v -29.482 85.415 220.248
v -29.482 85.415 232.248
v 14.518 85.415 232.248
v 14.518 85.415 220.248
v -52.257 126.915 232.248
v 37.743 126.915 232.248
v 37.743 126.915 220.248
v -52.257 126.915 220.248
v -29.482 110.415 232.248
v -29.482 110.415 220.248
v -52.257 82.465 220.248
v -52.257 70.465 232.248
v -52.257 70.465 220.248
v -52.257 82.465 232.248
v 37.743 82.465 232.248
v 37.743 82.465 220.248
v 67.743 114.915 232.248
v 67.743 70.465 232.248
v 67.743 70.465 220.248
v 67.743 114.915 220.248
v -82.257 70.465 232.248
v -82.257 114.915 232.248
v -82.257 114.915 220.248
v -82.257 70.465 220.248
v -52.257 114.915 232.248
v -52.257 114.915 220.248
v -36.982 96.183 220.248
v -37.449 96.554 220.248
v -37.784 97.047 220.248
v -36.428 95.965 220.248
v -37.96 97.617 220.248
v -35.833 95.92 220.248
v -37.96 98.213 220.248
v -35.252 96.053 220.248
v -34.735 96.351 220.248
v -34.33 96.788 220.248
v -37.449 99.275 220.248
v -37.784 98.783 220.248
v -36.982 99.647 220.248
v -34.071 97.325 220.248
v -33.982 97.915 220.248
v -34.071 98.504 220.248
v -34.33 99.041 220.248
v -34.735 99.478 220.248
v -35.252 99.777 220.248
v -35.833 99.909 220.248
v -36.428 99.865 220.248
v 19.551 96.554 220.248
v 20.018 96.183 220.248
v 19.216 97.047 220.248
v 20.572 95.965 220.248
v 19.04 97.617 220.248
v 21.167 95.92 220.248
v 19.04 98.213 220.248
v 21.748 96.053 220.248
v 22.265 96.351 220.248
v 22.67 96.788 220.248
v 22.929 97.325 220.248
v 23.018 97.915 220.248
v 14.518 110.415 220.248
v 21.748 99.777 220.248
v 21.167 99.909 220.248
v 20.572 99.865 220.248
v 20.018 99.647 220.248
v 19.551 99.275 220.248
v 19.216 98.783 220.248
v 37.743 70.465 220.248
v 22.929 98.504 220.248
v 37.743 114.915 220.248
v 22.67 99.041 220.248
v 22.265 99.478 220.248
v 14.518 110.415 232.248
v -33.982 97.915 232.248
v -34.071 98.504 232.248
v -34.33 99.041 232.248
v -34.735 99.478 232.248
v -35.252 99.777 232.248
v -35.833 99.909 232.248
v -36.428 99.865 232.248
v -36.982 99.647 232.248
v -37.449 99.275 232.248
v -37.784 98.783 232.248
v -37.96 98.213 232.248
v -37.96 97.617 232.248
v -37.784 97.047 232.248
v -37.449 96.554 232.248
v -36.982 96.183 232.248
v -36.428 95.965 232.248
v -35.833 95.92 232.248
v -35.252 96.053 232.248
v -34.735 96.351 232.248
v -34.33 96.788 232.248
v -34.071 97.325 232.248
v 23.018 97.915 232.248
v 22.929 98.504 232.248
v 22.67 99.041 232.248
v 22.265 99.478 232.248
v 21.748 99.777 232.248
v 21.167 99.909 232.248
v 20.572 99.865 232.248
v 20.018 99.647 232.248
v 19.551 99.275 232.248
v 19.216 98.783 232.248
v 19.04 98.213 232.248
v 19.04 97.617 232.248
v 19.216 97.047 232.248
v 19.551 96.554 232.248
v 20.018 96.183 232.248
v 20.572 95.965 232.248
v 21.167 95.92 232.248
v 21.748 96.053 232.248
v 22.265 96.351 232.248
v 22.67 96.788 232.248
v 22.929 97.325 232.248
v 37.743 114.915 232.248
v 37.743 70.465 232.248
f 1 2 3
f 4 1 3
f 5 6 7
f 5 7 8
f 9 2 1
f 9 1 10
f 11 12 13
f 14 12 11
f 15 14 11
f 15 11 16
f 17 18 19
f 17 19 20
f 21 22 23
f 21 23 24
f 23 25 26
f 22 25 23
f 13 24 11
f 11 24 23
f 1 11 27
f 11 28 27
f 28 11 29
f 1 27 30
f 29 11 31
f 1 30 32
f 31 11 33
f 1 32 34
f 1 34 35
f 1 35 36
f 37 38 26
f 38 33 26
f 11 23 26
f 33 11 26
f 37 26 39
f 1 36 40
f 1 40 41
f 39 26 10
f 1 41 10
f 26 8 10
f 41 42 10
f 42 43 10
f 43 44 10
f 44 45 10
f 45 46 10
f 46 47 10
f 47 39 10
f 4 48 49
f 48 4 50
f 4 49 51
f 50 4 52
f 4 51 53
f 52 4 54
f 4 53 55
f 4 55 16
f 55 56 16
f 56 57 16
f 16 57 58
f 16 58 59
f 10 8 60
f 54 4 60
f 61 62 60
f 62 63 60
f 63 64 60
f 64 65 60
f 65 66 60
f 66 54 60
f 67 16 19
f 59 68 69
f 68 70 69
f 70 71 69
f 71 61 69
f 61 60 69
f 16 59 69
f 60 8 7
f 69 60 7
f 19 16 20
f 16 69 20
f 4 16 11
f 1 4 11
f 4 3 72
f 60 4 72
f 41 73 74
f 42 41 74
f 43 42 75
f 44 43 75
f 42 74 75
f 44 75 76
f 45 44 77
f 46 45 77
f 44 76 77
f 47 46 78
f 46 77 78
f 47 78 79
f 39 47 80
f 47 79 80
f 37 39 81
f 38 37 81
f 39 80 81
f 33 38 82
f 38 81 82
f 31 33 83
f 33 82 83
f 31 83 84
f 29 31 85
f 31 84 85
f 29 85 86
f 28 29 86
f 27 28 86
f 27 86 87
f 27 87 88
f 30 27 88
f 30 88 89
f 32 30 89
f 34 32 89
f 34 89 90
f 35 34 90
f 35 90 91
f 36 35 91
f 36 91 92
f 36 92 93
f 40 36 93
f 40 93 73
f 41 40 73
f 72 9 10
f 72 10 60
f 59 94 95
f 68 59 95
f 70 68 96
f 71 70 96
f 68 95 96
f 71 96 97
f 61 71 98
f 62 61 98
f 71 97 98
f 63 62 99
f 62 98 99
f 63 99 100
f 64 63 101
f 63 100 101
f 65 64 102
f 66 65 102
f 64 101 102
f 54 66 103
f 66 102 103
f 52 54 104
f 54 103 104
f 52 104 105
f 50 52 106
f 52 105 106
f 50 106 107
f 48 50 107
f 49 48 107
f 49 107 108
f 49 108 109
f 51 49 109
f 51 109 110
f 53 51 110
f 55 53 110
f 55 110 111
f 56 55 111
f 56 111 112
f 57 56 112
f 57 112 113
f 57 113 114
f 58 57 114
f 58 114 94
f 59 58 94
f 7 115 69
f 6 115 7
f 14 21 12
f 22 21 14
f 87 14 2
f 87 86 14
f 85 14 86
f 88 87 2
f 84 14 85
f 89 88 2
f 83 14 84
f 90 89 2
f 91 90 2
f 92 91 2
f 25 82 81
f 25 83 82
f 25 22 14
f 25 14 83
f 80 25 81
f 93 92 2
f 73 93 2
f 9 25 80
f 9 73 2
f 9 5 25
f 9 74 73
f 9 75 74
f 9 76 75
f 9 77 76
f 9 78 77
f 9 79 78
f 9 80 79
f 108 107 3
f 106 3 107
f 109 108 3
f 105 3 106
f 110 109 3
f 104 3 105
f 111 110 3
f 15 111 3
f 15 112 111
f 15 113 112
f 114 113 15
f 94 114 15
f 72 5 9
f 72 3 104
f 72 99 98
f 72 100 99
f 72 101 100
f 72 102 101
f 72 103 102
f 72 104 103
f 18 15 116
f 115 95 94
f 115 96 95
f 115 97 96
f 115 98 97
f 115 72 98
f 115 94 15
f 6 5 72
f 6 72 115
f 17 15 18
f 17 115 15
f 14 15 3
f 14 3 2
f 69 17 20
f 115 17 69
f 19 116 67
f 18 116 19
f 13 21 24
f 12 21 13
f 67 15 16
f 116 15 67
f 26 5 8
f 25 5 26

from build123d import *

# Parameters (mm, degrees)
SKETCH1_W                    = 44
SKETCH1_H                    = 25
BOSS_EXTRUDE1_DEPTH          = 12
F_4_0_4_DIAMETER_HOLE1_D     = 4
F_4_0_4_DIAMETER_HOLE1_DEPTH = 25
F_4_0_4_DIAMETER_HOLE1_TIP   = 1.201721238


with BuildPart() as part:
    # Sketch1 → Boss-Extrude1 (new body)
    with BuildSketch(Plane.XY.offset(232.248004761)):
        Polygon((-82.257473883, 114.914823413), (-82.257473883, 82.464823413), (-82.257473883, 70.464823413), (-52.257473883, 70.464823413), (-52.257473883, 82.464823413), (-29.482473883, 82.464823413), (14.967526117, 82.464823413), (37.742526117, 82.464823413), (37.742526117, 70.464823413), (67.742526117, 70.464823413), (67.742526117, 82.464823413), (67.742526117, 114.914823413), (37.742526117, 114.914823413), (37.742526117, 126.914823413), (-52.257473883, 126.914823413), (-52.257473883, 114.914823413), align=None)
        with Locations((-7.482473883, 97.914823413)):
            Rectangle(SKETCH1_W, SKETCH1_H, mode=Mode.SUBTRACT)
    extrude(amount=-BOSS_EXTRUDE1_DEPTH)

    # Ø4.0 (4) Diameter Hole1
    with Locations(Plane(origin=(-7.257473883, 0, 220.248004761), x_dir=(-1, 0, 0), z_dir=(0, 0, -1))):
        with Locations((-28.275, 97.914823413), (28.725, 97.914823413)):
            Hole(F_4_0_4_DIAMETER_HOLE1_D / 2, depth=F_4_0_4_DIAMETER_HOLE1_DEPTH)
            with Locations((0, 0, -(F_4_0_4_DIAMETER_HOLE1_DEPTH + F_4_0_4_DIAMETER_HOLE1_TIP / 2))):  # 118° drill point
                Cone(0, F_4_0_4_DIAMETER_HOLE1_D / 2, F_4_0_4_DIAMETER_HOLE1_TIP, mode=Mode.SUBTRACT)


solid = part.part
